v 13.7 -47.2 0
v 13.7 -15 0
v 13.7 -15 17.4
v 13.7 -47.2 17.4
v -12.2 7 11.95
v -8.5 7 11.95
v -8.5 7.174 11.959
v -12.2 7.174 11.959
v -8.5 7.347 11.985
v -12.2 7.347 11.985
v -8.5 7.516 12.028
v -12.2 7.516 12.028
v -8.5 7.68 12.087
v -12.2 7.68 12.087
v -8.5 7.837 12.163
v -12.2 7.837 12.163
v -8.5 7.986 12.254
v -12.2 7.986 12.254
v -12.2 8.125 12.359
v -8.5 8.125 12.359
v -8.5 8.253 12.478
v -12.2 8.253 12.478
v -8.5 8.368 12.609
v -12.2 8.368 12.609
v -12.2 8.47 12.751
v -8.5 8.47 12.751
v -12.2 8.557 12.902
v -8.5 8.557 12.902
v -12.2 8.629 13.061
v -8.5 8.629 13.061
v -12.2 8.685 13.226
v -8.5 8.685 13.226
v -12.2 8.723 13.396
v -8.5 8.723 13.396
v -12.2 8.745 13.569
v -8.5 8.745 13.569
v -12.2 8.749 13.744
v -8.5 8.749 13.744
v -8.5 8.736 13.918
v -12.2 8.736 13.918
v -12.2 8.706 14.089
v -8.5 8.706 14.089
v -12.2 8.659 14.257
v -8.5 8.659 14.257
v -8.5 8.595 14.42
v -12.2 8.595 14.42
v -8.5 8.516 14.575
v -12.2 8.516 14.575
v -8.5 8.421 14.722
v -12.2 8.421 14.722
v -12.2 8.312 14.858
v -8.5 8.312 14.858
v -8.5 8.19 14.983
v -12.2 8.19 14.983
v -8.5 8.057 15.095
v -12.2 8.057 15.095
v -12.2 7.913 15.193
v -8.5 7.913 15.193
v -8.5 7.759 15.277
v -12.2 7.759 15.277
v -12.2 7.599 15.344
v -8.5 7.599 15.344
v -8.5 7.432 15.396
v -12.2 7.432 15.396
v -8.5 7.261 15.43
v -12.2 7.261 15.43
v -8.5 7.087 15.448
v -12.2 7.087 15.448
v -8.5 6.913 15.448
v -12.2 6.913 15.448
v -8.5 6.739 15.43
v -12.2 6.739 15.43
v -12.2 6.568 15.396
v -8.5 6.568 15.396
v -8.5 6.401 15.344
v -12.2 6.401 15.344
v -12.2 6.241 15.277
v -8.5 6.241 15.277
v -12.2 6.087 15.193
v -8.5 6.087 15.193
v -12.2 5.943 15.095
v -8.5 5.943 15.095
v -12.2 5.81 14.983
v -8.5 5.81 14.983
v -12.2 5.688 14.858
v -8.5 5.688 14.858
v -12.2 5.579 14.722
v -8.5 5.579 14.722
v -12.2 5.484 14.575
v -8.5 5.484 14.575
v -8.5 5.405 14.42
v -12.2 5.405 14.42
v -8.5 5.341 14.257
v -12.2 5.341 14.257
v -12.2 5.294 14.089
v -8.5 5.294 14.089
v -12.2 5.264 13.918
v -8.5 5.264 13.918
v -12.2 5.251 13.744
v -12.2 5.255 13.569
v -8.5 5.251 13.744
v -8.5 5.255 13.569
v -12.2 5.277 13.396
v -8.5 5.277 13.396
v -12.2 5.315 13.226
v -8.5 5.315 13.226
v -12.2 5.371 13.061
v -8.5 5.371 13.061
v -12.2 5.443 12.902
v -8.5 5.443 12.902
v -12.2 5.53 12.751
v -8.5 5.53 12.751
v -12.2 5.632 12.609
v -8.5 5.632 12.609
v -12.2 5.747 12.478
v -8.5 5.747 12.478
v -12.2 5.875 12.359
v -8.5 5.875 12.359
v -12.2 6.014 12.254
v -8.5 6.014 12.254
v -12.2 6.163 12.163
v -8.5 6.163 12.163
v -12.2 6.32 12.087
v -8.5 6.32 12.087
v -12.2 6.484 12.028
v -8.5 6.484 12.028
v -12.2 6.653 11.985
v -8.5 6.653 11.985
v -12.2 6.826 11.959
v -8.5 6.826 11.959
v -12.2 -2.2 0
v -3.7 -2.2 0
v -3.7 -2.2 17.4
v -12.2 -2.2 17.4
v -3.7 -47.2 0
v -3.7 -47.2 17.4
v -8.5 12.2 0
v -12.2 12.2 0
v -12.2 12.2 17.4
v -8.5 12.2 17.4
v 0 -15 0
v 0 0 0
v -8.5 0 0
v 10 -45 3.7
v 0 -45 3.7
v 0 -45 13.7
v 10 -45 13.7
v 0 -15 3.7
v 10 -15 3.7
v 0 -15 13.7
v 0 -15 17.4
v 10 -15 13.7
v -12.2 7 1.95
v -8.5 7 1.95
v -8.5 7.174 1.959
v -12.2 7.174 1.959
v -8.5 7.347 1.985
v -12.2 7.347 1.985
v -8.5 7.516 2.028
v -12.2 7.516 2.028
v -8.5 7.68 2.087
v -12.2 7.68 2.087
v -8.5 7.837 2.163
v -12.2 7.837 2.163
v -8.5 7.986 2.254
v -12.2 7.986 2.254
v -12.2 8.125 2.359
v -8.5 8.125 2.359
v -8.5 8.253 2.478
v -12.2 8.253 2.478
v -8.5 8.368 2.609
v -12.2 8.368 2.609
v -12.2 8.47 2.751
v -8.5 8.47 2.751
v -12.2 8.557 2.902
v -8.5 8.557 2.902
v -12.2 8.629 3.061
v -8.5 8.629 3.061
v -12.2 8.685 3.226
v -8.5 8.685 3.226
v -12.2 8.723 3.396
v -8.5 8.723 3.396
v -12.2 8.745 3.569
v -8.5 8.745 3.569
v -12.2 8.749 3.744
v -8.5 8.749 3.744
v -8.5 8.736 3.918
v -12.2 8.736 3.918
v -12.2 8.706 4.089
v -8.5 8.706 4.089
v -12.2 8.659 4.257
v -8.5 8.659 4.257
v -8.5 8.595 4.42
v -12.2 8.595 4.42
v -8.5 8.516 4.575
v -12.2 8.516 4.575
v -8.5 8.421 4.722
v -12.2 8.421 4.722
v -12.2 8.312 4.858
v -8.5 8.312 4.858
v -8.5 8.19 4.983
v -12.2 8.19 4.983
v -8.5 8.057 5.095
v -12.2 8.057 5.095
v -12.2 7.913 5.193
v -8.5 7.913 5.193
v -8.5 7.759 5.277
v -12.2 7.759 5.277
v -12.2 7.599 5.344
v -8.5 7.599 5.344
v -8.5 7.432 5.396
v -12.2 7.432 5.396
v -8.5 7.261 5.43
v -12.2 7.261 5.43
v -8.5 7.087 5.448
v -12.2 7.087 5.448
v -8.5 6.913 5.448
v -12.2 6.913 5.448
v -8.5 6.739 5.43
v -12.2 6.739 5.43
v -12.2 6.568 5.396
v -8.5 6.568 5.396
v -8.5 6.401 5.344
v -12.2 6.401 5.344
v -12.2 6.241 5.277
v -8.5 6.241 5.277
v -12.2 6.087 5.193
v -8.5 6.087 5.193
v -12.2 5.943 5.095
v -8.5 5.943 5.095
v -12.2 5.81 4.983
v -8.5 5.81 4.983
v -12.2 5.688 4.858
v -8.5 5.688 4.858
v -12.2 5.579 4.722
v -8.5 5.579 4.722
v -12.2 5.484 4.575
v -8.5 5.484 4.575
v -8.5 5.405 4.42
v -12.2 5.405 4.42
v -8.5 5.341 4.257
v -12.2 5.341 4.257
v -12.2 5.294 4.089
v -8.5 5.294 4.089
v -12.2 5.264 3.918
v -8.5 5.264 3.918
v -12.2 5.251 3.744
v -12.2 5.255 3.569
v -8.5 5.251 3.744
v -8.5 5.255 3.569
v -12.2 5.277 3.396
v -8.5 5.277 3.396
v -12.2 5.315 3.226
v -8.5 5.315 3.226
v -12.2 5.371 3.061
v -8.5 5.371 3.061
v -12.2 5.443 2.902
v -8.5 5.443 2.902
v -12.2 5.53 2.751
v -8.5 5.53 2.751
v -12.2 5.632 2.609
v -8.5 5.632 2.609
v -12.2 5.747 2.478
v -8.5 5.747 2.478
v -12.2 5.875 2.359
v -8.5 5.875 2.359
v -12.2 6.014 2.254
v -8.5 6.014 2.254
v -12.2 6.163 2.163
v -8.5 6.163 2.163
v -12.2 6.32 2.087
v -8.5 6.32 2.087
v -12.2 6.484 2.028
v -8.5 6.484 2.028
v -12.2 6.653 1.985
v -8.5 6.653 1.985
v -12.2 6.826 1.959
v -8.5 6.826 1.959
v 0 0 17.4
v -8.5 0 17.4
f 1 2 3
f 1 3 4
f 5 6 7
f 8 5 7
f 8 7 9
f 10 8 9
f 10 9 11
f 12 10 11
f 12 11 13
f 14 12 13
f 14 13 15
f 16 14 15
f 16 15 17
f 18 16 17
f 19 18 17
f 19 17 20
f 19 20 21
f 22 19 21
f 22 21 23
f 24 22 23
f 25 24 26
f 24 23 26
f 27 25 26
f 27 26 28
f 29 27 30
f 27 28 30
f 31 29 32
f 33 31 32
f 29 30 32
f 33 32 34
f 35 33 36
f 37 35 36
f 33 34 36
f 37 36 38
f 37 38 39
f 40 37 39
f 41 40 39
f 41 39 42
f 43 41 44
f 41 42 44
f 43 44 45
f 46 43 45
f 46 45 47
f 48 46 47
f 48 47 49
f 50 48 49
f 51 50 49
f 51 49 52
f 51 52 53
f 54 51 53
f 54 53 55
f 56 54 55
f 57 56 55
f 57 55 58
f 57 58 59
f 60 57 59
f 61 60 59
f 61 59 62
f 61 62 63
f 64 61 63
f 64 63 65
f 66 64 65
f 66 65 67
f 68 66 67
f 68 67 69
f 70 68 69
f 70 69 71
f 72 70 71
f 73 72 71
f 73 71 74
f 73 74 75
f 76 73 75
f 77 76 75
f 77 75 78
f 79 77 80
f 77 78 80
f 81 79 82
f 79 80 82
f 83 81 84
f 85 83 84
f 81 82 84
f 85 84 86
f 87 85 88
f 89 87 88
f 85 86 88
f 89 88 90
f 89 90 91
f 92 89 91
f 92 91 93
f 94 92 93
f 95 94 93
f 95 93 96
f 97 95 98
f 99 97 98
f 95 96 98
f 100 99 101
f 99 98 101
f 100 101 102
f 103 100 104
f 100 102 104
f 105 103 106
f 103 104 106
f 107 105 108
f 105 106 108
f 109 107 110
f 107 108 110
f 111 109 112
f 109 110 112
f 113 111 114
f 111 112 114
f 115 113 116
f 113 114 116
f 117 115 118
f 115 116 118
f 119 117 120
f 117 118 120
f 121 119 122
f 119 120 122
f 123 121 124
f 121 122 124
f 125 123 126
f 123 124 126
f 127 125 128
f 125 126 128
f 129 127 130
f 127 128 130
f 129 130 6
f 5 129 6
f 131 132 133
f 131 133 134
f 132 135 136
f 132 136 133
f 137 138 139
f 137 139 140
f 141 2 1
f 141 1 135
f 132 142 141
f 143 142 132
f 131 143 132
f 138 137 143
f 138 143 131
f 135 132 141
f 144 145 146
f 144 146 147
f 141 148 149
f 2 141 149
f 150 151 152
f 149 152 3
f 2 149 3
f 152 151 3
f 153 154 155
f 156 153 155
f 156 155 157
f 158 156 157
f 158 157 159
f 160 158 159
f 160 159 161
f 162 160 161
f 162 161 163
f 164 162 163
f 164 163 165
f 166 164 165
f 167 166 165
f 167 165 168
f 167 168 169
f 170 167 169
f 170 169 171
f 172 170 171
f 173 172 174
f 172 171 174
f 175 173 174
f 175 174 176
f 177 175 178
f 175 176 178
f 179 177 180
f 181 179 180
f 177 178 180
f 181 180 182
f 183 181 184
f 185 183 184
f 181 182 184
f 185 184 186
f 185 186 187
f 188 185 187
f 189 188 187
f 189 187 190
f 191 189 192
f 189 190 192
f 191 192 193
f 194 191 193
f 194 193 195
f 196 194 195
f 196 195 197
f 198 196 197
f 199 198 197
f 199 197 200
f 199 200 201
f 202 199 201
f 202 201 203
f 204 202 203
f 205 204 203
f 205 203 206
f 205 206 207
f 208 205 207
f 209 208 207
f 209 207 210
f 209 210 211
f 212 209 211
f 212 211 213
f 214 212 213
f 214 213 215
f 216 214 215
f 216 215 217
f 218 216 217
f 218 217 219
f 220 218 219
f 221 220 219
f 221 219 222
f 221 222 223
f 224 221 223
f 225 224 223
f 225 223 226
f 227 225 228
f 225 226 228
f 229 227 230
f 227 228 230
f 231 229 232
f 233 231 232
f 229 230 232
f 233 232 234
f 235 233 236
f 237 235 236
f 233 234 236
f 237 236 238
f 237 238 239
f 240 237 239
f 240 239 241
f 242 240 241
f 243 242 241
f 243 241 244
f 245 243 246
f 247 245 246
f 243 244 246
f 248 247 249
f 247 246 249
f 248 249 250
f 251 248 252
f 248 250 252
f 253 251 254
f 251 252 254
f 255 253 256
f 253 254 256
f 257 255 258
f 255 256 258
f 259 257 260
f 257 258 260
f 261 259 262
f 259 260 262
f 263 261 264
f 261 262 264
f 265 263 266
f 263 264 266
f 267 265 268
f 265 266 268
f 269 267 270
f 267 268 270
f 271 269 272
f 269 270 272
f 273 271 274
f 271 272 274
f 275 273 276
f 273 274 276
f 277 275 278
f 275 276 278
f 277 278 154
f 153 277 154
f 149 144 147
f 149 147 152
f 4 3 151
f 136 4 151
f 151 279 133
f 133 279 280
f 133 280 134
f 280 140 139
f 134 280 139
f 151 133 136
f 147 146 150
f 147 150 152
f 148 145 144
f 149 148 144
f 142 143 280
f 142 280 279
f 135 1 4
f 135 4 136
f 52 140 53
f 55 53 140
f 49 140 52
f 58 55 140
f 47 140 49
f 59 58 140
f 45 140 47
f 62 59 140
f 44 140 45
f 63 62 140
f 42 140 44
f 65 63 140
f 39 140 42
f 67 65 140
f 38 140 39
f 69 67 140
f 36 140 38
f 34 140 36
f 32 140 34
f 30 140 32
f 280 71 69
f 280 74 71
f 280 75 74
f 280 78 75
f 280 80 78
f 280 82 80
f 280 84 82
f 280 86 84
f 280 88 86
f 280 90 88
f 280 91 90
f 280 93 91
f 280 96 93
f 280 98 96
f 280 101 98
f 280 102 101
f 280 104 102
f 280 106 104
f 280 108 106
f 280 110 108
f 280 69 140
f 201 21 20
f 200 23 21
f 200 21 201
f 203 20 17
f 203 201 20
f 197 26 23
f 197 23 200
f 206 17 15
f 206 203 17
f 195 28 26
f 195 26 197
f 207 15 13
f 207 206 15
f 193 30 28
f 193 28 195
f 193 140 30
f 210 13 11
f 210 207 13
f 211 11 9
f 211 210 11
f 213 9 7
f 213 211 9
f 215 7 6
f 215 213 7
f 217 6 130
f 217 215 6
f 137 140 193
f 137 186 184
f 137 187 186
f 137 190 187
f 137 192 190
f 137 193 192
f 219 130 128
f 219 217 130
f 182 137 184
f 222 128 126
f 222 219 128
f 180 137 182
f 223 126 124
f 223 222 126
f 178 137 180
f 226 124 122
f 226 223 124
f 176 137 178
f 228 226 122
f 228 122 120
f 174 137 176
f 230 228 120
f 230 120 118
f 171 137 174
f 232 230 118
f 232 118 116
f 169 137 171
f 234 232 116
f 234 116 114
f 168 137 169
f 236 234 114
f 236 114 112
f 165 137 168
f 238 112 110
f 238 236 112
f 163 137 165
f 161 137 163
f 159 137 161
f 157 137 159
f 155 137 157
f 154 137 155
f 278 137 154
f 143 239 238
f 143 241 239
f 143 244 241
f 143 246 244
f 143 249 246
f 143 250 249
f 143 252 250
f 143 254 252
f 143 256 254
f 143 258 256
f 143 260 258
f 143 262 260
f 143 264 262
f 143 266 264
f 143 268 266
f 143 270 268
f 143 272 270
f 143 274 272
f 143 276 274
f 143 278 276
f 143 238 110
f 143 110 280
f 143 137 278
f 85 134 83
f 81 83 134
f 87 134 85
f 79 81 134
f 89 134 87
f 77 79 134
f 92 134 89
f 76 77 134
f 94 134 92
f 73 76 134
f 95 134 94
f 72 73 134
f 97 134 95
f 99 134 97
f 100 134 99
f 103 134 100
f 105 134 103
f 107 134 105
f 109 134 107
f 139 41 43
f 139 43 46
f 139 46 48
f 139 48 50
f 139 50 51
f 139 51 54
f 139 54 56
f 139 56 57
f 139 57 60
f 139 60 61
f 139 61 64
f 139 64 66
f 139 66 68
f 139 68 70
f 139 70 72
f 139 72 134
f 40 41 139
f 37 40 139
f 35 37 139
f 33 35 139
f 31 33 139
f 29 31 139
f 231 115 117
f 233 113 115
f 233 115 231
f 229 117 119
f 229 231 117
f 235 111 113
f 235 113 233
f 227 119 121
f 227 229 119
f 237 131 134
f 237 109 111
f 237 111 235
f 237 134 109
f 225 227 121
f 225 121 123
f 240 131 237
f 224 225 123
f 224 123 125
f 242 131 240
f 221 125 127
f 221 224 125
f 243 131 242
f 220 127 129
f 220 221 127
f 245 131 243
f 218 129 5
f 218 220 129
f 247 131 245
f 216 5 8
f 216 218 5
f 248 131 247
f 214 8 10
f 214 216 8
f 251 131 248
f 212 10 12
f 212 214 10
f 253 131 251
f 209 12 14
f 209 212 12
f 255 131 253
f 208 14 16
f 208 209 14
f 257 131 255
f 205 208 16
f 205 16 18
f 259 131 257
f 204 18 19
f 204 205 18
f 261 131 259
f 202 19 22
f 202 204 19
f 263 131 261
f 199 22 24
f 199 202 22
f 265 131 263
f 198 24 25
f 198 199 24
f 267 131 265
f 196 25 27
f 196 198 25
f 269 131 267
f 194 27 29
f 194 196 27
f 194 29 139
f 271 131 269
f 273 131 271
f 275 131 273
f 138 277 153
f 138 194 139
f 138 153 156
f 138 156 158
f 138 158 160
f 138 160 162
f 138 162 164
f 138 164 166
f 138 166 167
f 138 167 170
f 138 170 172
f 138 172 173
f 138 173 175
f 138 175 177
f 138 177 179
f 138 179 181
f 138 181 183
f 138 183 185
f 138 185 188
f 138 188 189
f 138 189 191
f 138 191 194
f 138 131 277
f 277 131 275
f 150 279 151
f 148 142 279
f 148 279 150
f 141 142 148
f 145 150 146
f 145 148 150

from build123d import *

# Parameters (mm, degrees)
BOSS_EXTRUDE1_DEPTH = 17.4
SKETCH3_W           = 10
SKETCH3_H           = 3.7
BOSS_EXTRUDE3_DEPTH = 30
SKETCH4_R           = 1.75
CUT_EXTRUDE1_DEPTH  = 55.985816353


with BuildPart() as part:
    # Sketch2 → Boss-Extrude1 (new body)
    with BuildSketch(Plane.XY):
        Polygon((-12.2, 12.2), (-8.5, 12.2), (-8.5, 0), (0, 0), (0, -45), (10, -45), (10, -15), (13.7, -15), (13.7, -47.2), (-3.7, -47.2), (-3.7, -2.2), (-12.2, -2.2), align=None)
    extrude(amount=BOSS_EXTRUDE1_DEPTH)

    # Sketch3 → Boss-Extrude3 (add)
    with BuildSketch(Plane.XZ.offset(45)):
        with Locations((5, 15.55)):
            Rectangle(SKETCH3_W, SKETCH3_H)
        with Locations((5, 1.85)):
            Rectangle(SKETCH3_W, SKETCH3_H)
    extrude(amount=-BOSS_EXTRUDE3_DEPTH)

    # Sketch4 → Cut-Extrude1 (cut, through all)
    with BuildSketch(Plane(origin=(-8.5, 0, 0), x_dir=(0, 0, -1), z_dir=(1, 0, 0))):
        with Locations((-13.7, 7)):
            Circle(SKETCH4_R)
        with Locations((-3.7, 7)):
            Circle(SKETCH4_R)
    extrude(amount=-CUT_EXTRUDE1_DEPTH, mode=Mode.SUBTRACT)


solid = part.part
